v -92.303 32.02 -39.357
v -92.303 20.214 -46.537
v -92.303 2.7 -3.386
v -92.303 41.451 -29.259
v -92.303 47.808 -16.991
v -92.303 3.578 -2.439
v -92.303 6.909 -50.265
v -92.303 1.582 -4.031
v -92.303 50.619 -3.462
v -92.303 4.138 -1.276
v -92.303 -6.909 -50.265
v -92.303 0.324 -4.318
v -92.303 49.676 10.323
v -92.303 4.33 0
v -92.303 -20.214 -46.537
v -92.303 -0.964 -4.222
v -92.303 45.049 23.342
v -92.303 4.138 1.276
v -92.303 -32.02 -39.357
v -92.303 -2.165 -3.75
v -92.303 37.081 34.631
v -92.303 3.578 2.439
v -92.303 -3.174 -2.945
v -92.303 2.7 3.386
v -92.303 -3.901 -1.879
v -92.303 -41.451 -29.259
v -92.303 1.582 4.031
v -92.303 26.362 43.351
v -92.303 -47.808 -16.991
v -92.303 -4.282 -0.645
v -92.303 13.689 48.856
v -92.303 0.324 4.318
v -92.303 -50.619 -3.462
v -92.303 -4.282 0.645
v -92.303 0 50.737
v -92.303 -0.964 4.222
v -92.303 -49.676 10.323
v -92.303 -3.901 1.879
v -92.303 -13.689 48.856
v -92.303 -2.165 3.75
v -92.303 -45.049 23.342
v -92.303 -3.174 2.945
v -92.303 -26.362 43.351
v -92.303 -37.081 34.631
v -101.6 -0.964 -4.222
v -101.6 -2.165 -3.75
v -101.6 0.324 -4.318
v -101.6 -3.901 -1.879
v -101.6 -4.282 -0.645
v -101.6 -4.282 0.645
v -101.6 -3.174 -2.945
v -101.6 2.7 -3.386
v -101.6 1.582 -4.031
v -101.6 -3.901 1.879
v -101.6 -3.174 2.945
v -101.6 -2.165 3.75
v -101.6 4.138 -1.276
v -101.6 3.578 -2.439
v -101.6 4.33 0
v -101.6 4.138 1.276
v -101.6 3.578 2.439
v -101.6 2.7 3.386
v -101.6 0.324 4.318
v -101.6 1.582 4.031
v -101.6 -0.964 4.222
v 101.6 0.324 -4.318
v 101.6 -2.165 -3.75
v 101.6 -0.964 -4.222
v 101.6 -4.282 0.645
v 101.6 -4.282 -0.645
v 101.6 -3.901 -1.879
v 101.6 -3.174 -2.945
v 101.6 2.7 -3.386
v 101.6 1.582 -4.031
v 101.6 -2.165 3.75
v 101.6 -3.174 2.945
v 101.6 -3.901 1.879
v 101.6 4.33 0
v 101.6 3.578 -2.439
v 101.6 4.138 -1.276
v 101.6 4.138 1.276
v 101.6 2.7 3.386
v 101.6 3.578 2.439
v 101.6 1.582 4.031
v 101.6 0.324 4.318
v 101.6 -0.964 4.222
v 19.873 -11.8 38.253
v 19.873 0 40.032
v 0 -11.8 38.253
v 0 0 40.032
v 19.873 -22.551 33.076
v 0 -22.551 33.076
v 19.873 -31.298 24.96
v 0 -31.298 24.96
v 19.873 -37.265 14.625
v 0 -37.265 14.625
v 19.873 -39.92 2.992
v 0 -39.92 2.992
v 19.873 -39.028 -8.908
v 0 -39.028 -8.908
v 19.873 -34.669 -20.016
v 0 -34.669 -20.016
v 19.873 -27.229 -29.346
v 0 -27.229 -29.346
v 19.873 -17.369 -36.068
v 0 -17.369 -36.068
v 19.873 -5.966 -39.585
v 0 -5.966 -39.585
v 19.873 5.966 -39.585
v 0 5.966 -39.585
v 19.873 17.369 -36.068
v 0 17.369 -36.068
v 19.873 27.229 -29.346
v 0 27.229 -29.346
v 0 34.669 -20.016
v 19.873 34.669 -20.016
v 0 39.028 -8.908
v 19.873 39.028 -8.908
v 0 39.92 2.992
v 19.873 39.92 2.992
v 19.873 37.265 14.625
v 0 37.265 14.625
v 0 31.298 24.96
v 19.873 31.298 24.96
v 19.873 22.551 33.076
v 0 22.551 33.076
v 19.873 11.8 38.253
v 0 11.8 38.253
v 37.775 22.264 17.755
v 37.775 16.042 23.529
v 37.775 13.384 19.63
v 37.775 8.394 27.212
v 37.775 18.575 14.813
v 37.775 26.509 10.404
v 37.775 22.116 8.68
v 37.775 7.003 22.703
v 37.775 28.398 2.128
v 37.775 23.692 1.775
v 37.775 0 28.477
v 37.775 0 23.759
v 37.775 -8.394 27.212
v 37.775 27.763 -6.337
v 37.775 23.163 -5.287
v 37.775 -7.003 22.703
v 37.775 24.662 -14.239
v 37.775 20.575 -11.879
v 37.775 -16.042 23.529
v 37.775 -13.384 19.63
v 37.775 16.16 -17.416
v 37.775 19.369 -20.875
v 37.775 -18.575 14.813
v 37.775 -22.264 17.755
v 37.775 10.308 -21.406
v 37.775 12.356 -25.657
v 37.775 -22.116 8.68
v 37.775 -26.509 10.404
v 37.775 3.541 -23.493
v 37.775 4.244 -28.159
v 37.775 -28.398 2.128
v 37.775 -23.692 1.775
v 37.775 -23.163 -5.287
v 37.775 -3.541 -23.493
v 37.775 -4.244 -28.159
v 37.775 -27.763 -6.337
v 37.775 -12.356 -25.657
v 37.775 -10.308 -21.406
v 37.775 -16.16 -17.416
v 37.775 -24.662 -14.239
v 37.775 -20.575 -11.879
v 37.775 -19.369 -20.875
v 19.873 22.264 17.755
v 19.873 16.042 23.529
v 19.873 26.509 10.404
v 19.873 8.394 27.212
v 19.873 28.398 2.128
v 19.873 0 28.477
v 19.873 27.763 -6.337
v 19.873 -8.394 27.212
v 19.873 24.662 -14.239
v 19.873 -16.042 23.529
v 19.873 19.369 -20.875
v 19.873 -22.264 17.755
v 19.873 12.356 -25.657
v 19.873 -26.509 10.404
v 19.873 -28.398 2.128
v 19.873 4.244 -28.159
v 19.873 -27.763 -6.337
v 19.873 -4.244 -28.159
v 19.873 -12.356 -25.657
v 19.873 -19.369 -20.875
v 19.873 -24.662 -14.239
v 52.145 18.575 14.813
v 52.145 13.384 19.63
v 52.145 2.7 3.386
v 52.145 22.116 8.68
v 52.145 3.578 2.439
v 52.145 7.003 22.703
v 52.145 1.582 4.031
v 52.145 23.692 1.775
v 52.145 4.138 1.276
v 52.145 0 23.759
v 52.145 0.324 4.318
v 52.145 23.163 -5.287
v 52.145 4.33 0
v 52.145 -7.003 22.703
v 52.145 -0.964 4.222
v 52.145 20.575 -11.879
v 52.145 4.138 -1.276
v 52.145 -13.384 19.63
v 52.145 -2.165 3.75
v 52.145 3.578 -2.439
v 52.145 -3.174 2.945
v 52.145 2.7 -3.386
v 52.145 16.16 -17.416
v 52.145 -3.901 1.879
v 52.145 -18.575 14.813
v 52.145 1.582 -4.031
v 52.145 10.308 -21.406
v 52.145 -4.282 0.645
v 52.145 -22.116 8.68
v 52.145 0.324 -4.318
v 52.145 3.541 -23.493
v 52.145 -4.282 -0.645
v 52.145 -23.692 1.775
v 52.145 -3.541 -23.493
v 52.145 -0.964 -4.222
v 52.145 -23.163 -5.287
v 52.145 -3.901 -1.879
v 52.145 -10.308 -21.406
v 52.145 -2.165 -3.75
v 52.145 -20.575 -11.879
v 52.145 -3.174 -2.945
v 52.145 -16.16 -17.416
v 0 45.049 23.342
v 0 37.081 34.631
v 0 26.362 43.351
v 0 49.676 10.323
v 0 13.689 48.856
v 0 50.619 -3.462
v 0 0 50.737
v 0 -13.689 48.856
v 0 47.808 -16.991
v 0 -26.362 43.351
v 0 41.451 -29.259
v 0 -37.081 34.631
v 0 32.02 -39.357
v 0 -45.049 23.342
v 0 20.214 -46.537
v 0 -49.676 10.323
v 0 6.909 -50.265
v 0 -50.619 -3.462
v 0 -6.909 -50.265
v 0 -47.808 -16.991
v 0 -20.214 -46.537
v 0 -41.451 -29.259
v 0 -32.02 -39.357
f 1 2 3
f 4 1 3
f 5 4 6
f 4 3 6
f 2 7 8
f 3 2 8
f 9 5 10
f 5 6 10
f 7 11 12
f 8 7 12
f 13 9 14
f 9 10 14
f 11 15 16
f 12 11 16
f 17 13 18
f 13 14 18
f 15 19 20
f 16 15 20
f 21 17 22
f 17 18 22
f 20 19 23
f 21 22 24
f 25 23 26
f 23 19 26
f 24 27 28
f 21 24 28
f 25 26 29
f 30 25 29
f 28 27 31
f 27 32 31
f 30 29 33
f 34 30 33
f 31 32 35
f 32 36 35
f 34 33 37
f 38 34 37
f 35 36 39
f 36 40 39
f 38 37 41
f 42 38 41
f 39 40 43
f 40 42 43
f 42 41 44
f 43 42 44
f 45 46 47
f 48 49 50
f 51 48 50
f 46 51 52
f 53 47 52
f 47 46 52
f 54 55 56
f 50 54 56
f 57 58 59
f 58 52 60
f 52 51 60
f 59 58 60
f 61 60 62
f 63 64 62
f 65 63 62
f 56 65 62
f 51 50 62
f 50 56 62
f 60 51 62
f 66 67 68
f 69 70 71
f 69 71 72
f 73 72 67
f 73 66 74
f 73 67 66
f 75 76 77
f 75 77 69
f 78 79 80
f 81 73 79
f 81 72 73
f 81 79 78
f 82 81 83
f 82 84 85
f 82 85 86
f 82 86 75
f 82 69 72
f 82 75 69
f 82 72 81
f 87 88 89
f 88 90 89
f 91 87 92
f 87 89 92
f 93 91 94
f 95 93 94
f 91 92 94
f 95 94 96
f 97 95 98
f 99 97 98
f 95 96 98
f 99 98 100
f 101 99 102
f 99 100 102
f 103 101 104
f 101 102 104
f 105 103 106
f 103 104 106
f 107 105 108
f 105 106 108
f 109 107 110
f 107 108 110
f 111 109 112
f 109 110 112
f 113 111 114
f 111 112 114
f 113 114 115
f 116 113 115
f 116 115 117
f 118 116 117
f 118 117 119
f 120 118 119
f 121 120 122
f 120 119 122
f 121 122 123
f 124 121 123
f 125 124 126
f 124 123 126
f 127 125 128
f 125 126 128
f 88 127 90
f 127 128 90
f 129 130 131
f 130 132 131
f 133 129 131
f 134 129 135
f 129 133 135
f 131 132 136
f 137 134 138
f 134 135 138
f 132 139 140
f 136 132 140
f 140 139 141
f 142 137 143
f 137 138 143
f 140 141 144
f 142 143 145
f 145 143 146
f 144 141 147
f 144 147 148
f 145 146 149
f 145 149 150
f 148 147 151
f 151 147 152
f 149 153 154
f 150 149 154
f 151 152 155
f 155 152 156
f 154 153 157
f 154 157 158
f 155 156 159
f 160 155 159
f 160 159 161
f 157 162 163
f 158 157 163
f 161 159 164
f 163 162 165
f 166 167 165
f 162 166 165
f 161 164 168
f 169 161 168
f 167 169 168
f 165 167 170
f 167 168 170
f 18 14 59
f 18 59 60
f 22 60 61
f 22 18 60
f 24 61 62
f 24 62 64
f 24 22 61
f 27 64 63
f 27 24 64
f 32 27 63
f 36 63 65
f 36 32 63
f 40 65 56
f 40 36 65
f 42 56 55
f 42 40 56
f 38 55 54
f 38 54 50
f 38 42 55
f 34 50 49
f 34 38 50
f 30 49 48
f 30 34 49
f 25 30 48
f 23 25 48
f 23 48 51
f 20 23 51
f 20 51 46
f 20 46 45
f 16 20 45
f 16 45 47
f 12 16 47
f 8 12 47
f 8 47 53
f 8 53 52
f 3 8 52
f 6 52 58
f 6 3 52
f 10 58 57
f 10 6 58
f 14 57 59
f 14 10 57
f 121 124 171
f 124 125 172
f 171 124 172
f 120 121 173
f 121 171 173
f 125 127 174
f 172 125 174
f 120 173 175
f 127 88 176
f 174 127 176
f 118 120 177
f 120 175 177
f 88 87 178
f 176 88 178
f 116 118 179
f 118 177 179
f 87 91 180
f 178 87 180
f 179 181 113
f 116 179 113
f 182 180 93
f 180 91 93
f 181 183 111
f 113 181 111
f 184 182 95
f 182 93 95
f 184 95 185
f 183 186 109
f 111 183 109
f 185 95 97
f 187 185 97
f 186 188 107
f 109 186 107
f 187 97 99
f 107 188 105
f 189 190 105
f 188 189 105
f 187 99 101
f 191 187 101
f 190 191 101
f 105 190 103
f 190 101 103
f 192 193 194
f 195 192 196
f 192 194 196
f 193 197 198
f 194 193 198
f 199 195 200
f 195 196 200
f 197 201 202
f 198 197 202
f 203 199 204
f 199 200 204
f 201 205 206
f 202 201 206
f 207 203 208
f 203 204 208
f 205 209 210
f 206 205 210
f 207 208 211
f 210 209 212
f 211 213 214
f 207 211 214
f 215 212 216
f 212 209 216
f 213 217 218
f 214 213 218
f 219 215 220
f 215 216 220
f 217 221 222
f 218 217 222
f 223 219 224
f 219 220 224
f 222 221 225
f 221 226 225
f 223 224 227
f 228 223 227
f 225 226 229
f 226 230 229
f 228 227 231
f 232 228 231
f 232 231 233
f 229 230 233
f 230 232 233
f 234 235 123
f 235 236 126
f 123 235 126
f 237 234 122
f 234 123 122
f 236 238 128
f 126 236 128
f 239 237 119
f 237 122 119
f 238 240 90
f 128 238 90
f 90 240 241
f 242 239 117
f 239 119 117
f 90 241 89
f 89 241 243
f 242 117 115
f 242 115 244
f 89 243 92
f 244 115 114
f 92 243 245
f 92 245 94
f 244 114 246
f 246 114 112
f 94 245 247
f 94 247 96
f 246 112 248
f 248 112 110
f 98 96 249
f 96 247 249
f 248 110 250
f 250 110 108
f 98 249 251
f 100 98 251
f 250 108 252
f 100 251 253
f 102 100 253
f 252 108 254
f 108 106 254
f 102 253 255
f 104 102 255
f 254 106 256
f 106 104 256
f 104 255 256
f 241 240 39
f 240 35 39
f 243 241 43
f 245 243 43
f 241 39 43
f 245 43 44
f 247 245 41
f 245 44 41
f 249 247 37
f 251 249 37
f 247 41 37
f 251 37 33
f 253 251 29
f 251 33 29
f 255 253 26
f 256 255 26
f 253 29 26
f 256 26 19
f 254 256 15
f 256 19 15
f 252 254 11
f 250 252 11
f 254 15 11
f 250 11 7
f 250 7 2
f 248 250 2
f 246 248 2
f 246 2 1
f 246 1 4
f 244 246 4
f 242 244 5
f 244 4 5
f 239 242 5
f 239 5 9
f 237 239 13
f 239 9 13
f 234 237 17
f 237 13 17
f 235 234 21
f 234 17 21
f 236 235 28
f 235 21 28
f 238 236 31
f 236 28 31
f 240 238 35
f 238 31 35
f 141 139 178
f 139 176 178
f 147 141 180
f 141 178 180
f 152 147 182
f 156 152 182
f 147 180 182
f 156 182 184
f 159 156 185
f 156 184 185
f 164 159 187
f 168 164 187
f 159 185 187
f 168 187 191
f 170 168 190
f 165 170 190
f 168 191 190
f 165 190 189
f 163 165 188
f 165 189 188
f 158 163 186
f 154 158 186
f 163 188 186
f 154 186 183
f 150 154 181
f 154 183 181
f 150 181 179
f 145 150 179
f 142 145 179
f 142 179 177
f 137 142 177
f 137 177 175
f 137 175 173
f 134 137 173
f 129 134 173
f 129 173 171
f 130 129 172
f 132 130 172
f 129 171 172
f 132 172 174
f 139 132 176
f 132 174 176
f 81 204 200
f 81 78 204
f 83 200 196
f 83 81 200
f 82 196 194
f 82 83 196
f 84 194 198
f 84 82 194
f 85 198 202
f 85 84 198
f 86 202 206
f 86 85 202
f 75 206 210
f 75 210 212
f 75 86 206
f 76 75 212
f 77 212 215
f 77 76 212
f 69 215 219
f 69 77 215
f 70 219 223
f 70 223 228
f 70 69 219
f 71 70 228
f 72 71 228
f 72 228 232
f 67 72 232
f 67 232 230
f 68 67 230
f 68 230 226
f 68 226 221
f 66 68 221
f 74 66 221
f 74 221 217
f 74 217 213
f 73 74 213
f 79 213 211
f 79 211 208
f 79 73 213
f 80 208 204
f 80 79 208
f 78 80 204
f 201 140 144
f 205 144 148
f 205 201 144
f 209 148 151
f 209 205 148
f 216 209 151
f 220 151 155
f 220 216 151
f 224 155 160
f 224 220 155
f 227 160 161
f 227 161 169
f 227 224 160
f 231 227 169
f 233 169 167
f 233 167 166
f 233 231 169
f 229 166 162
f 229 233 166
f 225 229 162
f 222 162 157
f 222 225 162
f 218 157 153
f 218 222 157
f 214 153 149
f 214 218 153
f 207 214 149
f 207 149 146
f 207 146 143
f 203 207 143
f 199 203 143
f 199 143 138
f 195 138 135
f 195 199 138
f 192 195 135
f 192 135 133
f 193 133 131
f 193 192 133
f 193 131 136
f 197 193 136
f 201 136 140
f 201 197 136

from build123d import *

# Parameters (mm, degrees)
F0_R     = 4.3303007039
F1_DEPTH = 101.6
F2_W     = 14.3698975444
F2_H     = 23.7585008144


with BuildPart() as f1:
    # F0 (on Right) → F1 (new body, symmetric)
    with BuildSketch(Plane.YZ):
        Circle(F0_R)
    extrude(amount=F1_DEPTH, both=True)

    # F2 (on Front) → F3 (revolve)
    with BuildSketch(Plane.XZ):
        Polygon((-92.3030078411, 50.7372282445), (-92.3030078411, 0), (0, 0), (0, 40.031991899), (0, 50.7372282445), align=None)
        Polygon((0, 40.031991899), (0, 0), (19.8729075491, 0), (19.8729075491, 28.4771621227), (19.8729075491, 40.031991899), align=None)
        Polygon((19.8729075491, 28.4771621227), (19.8729075491, 0), (37.7754718065, 0), (37.7754718065, 23.7585008144), (37.7754718065, 28.4771621227), align=None)
        with Locations((44.9604205787, 11.8792504072)):
            Rectangle(F2_W, F2_H)
    revolve(axis=Axis((0, 0, 0), (1, 0, 0)))


solid = f1.part
